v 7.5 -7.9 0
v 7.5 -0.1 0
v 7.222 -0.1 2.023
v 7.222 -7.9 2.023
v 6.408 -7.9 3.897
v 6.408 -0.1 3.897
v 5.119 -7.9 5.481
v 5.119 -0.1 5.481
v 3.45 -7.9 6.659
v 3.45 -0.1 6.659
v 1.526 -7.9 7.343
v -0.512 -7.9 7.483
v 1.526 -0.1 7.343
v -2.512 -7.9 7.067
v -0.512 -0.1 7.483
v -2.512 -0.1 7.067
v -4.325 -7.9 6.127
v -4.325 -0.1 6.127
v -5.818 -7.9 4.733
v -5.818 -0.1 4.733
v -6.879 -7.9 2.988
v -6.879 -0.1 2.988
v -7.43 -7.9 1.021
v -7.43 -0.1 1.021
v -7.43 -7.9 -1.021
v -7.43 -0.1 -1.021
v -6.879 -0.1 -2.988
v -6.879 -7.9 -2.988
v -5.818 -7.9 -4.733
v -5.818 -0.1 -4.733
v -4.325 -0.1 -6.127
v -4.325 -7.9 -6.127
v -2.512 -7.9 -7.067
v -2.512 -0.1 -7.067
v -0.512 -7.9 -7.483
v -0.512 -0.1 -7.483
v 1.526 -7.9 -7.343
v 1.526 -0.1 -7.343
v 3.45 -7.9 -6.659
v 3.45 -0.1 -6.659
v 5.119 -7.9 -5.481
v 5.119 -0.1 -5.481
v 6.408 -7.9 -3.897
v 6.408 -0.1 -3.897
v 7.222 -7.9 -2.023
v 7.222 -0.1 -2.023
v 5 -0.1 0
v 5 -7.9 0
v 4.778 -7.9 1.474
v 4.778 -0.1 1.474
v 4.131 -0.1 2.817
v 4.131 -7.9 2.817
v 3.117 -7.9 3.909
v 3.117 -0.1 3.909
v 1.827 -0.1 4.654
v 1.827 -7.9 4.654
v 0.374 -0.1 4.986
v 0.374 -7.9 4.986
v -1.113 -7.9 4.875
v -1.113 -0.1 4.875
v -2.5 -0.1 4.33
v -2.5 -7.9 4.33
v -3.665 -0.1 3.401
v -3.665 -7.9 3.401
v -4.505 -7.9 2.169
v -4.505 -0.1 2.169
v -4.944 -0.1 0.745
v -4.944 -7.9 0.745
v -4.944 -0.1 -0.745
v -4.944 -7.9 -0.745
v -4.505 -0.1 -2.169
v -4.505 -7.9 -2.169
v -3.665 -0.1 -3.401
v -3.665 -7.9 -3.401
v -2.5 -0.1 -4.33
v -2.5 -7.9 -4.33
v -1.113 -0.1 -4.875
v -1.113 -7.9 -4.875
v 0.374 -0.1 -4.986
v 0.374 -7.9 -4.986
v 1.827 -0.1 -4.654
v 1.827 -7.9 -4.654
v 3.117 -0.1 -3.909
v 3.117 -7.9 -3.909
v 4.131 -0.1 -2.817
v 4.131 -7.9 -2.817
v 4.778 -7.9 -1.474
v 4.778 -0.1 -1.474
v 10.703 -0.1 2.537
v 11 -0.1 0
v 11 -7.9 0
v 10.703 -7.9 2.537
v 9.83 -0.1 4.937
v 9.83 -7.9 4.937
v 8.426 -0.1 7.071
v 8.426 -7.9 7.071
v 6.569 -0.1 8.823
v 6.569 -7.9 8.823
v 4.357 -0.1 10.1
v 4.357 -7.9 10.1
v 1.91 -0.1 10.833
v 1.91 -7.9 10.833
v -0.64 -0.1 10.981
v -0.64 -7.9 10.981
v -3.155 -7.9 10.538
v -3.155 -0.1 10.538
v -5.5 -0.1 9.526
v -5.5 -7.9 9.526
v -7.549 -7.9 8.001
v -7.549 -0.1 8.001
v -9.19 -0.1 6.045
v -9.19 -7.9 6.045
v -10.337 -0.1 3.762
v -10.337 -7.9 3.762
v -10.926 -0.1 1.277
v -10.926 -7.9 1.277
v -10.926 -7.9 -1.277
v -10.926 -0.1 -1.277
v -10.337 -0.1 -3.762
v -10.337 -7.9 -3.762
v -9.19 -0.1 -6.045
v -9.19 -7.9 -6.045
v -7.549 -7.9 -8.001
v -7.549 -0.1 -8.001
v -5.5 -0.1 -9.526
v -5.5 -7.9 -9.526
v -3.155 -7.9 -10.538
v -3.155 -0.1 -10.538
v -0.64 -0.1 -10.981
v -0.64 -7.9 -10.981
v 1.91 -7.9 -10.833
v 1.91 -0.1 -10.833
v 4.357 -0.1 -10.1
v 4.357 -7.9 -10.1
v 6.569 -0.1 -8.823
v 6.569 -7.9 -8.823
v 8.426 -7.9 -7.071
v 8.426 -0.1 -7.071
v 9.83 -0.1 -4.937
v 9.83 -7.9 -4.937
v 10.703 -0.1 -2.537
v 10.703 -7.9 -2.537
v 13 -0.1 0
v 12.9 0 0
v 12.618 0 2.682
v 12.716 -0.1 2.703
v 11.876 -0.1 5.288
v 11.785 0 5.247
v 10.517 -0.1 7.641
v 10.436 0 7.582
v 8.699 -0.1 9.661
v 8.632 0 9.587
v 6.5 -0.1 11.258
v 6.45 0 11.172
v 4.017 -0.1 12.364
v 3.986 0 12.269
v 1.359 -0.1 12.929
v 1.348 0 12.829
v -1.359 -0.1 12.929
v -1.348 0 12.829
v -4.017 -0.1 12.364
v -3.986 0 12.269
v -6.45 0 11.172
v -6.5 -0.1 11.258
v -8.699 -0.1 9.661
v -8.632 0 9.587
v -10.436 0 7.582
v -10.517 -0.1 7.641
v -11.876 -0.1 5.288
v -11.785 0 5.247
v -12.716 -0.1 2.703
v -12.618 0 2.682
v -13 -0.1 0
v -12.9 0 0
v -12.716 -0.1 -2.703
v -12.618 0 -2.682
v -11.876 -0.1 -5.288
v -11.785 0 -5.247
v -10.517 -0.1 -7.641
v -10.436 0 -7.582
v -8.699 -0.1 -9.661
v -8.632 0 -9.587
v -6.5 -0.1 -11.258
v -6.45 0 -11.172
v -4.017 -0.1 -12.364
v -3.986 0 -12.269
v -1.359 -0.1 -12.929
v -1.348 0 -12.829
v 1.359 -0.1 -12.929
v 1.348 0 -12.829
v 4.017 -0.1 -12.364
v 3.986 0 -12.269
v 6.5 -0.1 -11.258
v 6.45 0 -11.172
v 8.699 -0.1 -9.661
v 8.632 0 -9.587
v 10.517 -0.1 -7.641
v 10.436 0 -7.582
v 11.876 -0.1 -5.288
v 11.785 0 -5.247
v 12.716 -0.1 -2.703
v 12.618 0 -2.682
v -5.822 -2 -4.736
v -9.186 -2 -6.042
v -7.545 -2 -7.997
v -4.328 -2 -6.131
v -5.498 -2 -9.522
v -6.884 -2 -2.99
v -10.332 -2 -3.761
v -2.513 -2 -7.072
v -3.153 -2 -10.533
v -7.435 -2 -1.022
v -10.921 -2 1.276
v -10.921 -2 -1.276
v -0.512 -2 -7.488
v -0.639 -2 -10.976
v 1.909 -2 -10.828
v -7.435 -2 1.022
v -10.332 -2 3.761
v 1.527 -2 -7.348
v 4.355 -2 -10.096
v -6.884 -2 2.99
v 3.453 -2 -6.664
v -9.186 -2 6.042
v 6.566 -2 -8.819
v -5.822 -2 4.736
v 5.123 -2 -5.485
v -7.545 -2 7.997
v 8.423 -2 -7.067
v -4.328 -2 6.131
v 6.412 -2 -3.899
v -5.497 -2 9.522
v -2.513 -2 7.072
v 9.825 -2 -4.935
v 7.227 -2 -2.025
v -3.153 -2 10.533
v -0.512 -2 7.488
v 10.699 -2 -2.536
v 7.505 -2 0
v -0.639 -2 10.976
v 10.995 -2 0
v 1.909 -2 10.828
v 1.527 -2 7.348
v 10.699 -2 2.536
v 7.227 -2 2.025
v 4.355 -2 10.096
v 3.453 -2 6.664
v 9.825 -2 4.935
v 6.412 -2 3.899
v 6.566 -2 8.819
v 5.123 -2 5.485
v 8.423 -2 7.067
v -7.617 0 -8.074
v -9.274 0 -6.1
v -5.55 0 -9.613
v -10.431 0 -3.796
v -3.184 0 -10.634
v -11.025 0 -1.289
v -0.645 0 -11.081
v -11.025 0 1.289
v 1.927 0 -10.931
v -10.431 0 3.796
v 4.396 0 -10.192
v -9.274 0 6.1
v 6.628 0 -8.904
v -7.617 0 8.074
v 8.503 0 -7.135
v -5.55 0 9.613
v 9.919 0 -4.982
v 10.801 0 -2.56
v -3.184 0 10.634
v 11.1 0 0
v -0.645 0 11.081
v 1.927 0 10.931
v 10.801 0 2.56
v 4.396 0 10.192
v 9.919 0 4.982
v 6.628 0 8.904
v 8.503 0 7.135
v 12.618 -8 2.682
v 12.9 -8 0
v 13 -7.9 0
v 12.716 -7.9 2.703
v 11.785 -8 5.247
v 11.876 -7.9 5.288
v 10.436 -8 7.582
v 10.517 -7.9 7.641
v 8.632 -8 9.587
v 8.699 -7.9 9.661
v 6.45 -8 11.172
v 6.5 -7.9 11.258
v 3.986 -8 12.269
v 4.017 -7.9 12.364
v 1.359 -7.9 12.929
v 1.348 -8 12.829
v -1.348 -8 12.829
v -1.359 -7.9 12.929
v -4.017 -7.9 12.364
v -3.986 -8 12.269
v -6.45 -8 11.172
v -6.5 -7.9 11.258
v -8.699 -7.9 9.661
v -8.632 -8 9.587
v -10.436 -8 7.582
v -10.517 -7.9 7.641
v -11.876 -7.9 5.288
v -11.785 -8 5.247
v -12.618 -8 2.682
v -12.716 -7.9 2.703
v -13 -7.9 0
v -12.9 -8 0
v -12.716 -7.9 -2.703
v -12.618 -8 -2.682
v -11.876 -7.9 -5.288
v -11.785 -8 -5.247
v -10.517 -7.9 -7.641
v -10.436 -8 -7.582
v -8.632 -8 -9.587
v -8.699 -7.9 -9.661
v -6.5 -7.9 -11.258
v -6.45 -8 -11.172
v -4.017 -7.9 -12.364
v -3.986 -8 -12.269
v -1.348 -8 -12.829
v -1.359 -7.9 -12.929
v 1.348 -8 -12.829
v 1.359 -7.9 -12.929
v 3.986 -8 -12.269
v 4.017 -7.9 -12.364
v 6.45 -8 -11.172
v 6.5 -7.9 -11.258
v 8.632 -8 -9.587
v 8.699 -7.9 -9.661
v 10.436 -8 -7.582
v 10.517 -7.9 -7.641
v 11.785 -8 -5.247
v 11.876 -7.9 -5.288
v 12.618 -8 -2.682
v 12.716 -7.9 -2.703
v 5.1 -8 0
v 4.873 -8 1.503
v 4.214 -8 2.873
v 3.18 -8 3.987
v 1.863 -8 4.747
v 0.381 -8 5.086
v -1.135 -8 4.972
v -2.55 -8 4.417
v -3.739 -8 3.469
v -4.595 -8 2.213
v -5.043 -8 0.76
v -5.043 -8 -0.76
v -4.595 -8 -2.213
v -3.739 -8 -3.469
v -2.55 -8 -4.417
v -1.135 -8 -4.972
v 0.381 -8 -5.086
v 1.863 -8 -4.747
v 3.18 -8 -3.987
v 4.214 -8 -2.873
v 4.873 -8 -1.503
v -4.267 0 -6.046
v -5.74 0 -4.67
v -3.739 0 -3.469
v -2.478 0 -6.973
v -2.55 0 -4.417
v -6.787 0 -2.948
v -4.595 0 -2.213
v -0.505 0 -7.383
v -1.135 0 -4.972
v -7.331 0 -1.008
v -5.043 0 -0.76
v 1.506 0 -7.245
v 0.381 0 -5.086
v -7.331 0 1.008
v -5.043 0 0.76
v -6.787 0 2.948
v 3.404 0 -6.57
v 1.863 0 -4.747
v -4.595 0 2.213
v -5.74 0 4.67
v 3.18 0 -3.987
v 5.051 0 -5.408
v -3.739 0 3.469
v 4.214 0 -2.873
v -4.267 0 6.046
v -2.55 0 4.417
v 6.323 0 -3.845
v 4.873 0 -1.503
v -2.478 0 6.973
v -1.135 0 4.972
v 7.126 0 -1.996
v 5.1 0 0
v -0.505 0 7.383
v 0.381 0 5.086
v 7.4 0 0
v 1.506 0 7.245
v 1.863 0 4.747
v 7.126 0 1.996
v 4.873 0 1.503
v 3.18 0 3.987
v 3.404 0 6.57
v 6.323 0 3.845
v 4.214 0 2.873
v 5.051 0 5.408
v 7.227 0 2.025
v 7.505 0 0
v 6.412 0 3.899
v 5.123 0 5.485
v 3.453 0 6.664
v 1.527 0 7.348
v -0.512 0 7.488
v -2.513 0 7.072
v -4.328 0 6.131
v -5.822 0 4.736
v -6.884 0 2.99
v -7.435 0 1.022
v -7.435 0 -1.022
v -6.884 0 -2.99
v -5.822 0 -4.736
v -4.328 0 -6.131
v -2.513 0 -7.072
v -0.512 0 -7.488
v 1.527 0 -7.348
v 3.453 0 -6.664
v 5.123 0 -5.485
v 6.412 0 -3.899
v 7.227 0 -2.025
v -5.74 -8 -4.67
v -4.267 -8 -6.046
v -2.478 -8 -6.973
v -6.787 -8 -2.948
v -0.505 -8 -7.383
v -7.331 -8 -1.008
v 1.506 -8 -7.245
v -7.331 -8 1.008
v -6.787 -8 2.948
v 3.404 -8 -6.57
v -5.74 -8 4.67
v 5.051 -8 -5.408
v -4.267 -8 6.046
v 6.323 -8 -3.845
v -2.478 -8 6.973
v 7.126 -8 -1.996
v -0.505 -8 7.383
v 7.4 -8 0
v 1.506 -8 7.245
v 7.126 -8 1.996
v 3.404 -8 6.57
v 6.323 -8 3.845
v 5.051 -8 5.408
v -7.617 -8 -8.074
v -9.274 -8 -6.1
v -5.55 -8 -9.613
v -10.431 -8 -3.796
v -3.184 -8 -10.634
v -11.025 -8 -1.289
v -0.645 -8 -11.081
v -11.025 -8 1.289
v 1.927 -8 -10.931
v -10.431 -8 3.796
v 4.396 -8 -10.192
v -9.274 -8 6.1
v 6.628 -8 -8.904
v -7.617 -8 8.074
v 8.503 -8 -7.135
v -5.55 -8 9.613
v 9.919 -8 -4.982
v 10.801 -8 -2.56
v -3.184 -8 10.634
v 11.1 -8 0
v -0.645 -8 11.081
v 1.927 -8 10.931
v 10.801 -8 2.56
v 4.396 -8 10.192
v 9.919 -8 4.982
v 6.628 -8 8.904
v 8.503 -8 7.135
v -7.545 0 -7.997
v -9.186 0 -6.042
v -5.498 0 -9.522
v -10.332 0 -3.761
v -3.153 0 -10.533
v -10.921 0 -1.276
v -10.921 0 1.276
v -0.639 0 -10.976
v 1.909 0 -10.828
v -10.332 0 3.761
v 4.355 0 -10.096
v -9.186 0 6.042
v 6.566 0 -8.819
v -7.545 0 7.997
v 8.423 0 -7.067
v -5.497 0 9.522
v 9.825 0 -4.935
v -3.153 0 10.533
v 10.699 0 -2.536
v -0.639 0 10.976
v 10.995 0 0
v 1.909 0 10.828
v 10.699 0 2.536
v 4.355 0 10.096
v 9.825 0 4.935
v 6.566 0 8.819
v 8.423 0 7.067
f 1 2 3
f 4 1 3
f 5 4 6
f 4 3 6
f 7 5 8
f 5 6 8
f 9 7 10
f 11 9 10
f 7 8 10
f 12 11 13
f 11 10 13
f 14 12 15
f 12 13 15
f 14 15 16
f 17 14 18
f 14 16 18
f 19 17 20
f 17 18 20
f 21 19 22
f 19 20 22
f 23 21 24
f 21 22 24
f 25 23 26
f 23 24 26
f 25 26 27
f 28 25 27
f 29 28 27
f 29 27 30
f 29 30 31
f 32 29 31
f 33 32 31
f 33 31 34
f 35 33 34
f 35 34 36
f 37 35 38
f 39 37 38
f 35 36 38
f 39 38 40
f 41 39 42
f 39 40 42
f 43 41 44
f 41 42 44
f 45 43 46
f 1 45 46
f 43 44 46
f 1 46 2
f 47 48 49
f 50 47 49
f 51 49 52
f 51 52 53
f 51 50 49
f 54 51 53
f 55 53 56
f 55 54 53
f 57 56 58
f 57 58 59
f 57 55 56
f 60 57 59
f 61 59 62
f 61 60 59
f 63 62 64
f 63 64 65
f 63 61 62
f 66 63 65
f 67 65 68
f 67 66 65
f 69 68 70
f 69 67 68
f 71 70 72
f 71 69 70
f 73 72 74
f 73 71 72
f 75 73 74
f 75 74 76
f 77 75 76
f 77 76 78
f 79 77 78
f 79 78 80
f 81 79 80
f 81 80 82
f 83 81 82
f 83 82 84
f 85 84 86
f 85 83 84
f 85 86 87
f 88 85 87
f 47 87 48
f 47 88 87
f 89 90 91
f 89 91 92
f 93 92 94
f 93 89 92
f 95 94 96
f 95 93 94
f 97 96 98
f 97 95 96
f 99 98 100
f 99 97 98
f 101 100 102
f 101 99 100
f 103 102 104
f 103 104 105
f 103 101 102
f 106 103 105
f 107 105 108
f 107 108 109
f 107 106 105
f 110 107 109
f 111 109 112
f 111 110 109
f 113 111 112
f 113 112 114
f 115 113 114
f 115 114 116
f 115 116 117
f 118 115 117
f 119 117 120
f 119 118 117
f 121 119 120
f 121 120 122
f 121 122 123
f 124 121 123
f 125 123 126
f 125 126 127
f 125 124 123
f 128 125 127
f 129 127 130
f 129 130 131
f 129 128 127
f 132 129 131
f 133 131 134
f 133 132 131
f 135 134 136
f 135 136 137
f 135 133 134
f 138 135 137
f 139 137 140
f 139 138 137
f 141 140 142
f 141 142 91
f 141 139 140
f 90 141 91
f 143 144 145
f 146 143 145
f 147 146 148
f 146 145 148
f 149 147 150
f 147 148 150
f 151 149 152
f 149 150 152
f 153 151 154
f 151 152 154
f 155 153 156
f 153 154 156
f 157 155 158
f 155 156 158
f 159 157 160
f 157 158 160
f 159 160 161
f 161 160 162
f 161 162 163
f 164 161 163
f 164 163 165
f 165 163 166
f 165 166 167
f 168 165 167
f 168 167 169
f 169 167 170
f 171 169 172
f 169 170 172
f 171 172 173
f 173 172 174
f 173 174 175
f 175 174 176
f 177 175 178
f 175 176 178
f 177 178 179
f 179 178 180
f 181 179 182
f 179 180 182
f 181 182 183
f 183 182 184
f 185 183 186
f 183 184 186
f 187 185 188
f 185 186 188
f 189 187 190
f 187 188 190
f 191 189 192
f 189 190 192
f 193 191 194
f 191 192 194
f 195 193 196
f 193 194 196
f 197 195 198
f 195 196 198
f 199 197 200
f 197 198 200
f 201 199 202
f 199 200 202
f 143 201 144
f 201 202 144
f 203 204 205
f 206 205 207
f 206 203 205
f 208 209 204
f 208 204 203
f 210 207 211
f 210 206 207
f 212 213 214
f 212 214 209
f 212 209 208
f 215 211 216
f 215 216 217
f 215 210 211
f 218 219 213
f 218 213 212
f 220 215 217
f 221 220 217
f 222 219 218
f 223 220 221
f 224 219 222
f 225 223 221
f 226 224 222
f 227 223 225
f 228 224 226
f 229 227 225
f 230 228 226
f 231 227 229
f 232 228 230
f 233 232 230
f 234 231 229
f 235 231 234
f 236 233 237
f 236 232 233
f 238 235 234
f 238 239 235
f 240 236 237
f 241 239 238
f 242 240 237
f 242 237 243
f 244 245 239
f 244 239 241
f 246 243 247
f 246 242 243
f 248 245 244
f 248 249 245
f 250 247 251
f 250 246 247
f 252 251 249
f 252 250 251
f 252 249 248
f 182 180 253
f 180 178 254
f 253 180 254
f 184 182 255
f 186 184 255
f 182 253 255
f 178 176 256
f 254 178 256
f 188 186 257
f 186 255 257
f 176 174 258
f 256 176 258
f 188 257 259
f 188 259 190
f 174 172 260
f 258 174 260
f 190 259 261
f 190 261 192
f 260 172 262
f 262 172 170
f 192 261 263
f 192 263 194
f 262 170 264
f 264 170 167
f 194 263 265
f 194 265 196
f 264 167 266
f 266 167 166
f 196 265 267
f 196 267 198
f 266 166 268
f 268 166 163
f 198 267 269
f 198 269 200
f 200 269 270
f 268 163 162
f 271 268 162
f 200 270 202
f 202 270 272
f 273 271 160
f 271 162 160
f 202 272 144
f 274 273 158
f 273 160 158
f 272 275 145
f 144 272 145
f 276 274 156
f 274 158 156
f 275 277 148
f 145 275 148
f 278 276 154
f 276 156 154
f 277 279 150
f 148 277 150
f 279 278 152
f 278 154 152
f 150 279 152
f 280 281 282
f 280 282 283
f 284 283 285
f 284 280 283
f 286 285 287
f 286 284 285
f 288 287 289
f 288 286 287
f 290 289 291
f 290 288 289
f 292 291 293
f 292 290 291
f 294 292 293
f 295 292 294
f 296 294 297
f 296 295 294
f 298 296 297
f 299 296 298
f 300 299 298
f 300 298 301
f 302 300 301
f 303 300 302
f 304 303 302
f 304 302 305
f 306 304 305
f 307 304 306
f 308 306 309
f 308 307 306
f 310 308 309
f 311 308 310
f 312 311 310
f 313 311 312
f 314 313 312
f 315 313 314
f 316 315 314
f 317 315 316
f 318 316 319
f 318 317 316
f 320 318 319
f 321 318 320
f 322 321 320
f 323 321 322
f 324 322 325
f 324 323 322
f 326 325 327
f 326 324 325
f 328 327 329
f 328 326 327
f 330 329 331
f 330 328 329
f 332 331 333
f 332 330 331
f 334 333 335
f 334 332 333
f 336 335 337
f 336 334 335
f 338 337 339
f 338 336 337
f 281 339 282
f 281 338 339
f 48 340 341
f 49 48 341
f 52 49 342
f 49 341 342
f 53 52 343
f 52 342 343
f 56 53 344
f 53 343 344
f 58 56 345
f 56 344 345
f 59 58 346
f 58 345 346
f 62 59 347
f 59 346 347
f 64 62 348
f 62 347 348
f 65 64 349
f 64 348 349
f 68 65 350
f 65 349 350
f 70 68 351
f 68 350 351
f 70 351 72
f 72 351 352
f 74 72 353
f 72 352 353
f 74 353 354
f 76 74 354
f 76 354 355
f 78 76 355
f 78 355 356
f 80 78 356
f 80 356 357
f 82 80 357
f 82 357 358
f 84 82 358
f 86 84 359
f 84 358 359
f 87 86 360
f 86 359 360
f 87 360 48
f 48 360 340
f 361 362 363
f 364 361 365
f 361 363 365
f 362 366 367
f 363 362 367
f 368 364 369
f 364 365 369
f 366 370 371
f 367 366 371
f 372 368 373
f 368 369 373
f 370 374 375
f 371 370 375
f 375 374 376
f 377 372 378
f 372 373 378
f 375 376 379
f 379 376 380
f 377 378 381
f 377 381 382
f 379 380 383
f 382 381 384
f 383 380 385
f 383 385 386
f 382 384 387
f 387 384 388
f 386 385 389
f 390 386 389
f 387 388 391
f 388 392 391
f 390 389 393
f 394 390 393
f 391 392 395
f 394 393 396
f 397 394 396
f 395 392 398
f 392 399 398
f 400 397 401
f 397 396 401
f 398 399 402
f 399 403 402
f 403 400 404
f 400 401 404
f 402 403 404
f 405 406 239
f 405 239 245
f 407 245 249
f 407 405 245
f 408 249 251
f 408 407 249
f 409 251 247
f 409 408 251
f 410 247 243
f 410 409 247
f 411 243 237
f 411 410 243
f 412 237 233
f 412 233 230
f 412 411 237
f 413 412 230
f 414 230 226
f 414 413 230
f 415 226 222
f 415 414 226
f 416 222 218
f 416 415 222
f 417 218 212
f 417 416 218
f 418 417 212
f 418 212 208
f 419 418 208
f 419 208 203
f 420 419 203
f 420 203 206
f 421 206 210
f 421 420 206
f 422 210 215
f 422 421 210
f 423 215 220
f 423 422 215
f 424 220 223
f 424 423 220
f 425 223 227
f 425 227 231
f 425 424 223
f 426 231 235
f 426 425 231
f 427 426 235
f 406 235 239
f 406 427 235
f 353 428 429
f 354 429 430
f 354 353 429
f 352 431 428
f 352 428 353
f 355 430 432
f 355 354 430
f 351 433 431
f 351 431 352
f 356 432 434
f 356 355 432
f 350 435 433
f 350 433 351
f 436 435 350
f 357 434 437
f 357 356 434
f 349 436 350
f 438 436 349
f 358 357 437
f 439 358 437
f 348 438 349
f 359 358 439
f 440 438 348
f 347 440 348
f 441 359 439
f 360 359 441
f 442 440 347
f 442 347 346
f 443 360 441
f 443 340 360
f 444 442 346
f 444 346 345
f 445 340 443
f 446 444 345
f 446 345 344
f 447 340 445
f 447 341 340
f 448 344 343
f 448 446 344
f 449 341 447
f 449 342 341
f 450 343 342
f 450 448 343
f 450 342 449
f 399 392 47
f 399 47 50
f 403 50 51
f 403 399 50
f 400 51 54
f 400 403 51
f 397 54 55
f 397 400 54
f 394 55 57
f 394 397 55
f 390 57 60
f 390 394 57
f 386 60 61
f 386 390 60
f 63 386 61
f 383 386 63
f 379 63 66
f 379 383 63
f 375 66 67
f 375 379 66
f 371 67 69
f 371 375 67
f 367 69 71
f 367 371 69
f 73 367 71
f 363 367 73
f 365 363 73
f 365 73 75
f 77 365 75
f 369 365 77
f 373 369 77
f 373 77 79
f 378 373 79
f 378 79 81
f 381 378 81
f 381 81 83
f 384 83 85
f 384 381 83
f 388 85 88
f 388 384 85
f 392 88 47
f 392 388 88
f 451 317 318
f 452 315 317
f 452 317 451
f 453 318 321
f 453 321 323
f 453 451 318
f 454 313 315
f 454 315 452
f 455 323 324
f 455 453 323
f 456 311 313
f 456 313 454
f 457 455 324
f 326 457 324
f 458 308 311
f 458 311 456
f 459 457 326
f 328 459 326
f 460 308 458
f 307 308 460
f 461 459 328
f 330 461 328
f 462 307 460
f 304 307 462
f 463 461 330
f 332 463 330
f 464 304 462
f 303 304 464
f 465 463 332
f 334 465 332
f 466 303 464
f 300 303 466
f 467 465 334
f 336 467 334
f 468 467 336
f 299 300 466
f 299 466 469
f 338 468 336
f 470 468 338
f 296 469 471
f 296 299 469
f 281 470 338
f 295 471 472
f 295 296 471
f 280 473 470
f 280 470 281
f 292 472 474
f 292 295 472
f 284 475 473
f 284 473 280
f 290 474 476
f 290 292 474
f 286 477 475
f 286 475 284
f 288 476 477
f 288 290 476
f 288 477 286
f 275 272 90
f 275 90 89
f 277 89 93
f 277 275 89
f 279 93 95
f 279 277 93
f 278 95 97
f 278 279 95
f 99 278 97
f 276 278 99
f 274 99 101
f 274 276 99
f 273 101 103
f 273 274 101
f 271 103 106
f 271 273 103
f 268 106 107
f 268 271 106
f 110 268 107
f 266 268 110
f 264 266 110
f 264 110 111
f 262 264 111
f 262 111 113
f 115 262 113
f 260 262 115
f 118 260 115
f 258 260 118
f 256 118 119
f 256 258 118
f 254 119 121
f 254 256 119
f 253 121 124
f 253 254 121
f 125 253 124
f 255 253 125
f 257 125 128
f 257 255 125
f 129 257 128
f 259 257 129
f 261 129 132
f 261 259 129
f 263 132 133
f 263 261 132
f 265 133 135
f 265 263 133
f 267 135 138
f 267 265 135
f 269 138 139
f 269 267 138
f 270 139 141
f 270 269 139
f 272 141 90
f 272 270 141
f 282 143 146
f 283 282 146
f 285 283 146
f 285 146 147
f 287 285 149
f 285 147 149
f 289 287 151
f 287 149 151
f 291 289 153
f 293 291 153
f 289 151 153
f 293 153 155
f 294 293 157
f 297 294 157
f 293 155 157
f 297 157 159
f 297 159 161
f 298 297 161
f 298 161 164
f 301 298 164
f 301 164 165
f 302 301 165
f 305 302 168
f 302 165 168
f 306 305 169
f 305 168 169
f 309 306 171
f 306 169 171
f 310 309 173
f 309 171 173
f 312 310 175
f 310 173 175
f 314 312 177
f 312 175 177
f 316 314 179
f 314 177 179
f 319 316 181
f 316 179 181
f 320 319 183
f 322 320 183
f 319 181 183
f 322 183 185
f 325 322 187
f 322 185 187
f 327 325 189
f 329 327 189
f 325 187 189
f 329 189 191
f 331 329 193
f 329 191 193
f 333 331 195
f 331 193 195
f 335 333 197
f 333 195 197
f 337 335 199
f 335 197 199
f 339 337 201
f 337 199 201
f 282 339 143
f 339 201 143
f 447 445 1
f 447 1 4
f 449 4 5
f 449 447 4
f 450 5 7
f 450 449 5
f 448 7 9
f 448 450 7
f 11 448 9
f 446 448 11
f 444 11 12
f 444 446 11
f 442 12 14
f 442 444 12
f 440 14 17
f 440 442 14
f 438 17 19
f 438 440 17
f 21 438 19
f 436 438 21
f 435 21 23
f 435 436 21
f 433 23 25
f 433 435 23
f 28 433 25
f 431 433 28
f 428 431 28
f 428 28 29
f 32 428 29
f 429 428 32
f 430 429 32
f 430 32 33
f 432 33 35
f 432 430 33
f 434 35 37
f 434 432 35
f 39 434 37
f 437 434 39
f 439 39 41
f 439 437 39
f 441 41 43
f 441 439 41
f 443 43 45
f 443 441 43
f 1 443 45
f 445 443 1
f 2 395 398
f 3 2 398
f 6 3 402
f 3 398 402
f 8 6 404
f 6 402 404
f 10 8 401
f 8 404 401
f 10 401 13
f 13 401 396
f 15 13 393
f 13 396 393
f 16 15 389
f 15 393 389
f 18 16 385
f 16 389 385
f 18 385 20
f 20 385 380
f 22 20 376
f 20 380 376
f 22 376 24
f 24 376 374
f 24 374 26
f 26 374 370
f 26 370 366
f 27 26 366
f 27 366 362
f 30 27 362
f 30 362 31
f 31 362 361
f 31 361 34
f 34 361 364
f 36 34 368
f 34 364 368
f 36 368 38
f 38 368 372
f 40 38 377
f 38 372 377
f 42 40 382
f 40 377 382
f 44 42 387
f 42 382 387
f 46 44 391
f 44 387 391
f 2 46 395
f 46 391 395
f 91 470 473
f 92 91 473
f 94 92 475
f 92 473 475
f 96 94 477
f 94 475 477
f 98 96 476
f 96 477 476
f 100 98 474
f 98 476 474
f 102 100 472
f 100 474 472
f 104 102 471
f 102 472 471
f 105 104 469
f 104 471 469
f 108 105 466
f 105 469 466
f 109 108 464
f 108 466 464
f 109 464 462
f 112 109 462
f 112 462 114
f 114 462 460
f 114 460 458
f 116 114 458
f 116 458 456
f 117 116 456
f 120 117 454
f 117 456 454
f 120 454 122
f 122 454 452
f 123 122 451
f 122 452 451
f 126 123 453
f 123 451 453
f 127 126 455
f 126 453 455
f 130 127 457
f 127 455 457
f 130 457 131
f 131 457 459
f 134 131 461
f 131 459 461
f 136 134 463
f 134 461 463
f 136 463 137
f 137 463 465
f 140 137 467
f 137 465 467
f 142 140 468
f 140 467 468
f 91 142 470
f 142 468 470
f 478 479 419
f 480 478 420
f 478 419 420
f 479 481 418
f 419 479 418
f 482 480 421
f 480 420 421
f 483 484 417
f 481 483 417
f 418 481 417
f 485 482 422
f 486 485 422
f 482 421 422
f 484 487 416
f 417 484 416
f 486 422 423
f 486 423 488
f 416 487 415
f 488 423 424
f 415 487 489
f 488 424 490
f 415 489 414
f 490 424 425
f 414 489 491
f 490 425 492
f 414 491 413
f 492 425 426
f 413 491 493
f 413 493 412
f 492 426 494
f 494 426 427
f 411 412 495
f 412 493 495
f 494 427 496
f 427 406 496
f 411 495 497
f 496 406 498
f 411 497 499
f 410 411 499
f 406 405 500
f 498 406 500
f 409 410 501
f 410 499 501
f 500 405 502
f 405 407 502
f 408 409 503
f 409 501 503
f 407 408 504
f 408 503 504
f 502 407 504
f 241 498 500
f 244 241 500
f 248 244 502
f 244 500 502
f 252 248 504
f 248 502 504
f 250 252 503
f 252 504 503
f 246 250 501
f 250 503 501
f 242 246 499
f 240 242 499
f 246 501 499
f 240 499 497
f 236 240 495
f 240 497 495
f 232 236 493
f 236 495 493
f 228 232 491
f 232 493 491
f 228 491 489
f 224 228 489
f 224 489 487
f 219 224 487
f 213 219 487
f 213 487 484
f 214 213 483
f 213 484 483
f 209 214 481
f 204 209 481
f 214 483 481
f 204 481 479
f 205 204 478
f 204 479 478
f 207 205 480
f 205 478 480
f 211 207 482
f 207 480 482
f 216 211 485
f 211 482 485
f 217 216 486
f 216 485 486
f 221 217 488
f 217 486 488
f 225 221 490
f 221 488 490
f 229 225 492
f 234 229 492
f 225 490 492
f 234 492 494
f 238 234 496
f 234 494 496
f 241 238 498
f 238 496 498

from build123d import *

# Parameters (mm, degrees)
F0_R      = 13
F0_R_2    = 11
F2_DEPTH  = 8
F1_R      = 7.5
F1_R_2    = 5
F3_DEPTH  = 8
F4_SIZE   = 0.1
F4_2_SIZE = 0.1
F5_R      = 10.995
F5_R_2    = 7.505
F6_DEPTH  = 2


with BuildPart() as f2:
    # F0 (on Front) → F2 (new body)
    with BuildSketch(Plane.XZ):
        Circle(F0_R)
        Circle(F0_R_2, mode=Mode.SUBTRACT)
    extrude(amount=F2_DEPTH)

    # F4
    f4_edges = [f2.edges().sort_by_distance(p)[0] for p in [
        (-13, 0, 0),
        (-11, 0, 0),
        (-13, -8, 0),
        (-11, -8, 0),
    ]]
    chamfer(f4_edges, length=F4_SIZE)


with BuildPart() as f3:
    # F1 (on Front) → F3 (new body)
    with BuildSketch(Plane.XZ):
        Circle(F1_R)
        Circle(F1_R_2, mode=Mode.SUBTRACT)
    extrude(amount=F3_DEPTH)

    # F4#2
    f4_2_edges = [f3.edges().sort_by_distance(p)[0] for p in [
        (-7.5, 0, 0),
        (-5, 0, 0),
        (-7.5, -8, 0),
        (-5, -8, 0),
    ]]
    chamfer(f4_2_edges, length=F4_2_SIZE)


with BuildPart() as f6:
    # F5 (on Front) → F6 (new body)
    with BuildSketch(Plane.XZ):
        Circle(F5_R)
        Circle(F5_R_2, mode=Mode.SUBTRACT)
    extrude(amount=F6_DEPTH)


solid = Compound([f2.part, f3.part, f6.part])
